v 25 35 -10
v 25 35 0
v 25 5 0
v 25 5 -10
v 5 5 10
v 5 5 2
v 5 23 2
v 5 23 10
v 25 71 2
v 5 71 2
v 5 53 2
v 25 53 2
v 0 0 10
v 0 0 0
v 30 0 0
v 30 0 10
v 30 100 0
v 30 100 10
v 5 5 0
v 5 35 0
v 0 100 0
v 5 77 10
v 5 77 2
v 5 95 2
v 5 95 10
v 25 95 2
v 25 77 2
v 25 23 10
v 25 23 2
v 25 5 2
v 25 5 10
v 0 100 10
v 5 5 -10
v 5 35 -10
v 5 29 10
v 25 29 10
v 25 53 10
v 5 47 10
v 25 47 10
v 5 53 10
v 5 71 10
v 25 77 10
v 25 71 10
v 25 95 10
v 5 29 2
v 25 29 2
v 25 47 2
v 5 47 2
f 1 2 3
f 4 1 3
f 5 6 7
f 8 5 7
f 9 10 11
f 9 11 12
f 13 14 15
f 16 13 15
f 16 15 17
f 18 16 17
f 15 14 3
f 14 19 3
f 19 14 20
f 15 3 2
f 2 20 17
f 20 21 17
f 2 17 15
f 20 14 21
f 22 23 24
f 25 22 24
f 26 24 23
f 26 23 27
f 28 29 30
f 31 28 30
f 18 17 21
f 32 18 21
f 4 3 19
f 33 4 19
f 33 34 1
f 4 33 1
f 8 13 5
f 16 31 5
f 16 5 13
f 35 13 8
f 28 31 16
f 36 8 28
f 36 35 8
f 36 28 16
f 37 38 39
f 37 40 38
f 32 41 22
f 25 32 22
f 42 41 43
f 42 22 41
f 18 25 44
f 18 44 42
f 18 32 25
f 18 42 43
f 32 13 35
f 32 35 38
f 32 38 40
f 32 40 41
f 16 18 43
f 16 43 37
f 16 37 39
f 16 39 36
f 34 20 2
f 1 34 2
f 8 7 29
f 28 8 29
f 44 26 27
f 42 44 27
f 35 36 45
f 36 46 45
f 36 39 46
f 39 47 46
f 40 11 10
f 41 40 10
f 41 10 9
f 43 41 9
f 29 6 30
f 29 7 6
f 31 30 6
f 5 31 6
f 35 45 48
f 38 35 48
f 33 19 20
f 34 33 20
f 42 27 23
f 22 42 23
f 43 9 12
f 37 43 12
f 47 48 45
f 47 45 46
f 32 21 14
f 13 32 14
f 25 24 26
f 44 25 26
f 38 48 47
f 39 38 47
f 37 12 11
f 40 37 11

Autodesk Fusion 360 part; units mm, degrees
sketch " Compartment Divet" plane through (0, 0, 0) normal (0, 0, 1) x (1, 0, 0)
  line L0 (5, 5) -> (25, 5) construction
  line L1 (25, 5) -> (25, 35) construction
  line L2 (25, 35) -> (5, 35) construction
  line L3 (5, 35) -> (5, 5) construction
  line L4 (5, 35) -> (25, 35)
  line L5 (25, 35) -> (25, 5)
  line L6 (25, 5) -> (5, 5)
  line L7 (5, 5) -> (5, 35)
  dimension "d3" = 20
  dimension "d4" = 30
sketch "Compartment Body" plane through (0, 0, 0) normal (0, 0, 1) x (1, 0, 0)
  line L0 (0, 0) -> (30, 0)
  line L1 (30, 0) -> (30, 100)
  line L2 (30, 100) -> (0, 100)
  line L3 (0, 100) -> (0, 0)
  line L4 (5, 95) -> (25, 95)
  line L5 (25, 95) -> (25, 5)
  line L6 (25, 5) -> (5, 5)
  line L7 (5, 5) -> (5, 95)
  line L8 (5, 95) -> (25, 95)
  line L9 (25, 95) -> (25, 77)
  line L10 (25, 77) -> (5, 77)
  line L11 (5, 77) -> (5, 95)
  line L12 (5, 71) -> (25, 71)
  line L13 (25, 71) -> (25, 53)
  line L14 (25, 53) -> (5, 53)
  line L15 (5, 53) -> (5, 71)
  line L16 (5, 47) -> (25, 47)
  line L17 (25, 47) -> (25, 29)
  line L18 (25, 29) -> (5, 29)
  line L19 (5, 29) -> (5, 47)
  line L20 (5, 23) -> (25, 23)
  line L21 (25, 23) -> (25, 5)
  line L22 (25, 5) -> (5, 5)
  line L23 (5, 5) -> (5, 23)
  dimension "d7" = 30
  dimension "d8" = 100
  dimension "d11" = 18
  dimension "d12" = 18
  dimension "d13" = 18
  dimension "d14" = 18
extrude "Extrude2" add sketch " Compartment Divet" against normal blind 10 makes body 1
extrude "Extrude3" add sketch "Compartment Body" along normal blind 5 contours L4 L5 L7 L8 L9 L10 L11 | L5 L7 L12 L13 L14 L15 | L5 L7 L16 L17 L18 L19 | L5 L6 L7 L20 L21 L22 L23 bodies 1 makes body 2 at (11.6667, 65, 0) makes body 3 at (11.6667, 89, 0)
extrude "Extrude4" add sketch "Compartment Body" along normal blind 10 contours L0 L1 L2 L3 | L5 L7 L10 L12 | L5 L7 L14 L16 | L5 L7 L18 L20 bodies 1 2 3
extrude "Extrude5" cut 4 faces at (11.6667, 17, 5) (18.3333, 41, 5) (11.6667, 65, 5) (11.6667, 89, 5) along direction (0, 0, -1) blind 3 on bodies 1 bodies 1
